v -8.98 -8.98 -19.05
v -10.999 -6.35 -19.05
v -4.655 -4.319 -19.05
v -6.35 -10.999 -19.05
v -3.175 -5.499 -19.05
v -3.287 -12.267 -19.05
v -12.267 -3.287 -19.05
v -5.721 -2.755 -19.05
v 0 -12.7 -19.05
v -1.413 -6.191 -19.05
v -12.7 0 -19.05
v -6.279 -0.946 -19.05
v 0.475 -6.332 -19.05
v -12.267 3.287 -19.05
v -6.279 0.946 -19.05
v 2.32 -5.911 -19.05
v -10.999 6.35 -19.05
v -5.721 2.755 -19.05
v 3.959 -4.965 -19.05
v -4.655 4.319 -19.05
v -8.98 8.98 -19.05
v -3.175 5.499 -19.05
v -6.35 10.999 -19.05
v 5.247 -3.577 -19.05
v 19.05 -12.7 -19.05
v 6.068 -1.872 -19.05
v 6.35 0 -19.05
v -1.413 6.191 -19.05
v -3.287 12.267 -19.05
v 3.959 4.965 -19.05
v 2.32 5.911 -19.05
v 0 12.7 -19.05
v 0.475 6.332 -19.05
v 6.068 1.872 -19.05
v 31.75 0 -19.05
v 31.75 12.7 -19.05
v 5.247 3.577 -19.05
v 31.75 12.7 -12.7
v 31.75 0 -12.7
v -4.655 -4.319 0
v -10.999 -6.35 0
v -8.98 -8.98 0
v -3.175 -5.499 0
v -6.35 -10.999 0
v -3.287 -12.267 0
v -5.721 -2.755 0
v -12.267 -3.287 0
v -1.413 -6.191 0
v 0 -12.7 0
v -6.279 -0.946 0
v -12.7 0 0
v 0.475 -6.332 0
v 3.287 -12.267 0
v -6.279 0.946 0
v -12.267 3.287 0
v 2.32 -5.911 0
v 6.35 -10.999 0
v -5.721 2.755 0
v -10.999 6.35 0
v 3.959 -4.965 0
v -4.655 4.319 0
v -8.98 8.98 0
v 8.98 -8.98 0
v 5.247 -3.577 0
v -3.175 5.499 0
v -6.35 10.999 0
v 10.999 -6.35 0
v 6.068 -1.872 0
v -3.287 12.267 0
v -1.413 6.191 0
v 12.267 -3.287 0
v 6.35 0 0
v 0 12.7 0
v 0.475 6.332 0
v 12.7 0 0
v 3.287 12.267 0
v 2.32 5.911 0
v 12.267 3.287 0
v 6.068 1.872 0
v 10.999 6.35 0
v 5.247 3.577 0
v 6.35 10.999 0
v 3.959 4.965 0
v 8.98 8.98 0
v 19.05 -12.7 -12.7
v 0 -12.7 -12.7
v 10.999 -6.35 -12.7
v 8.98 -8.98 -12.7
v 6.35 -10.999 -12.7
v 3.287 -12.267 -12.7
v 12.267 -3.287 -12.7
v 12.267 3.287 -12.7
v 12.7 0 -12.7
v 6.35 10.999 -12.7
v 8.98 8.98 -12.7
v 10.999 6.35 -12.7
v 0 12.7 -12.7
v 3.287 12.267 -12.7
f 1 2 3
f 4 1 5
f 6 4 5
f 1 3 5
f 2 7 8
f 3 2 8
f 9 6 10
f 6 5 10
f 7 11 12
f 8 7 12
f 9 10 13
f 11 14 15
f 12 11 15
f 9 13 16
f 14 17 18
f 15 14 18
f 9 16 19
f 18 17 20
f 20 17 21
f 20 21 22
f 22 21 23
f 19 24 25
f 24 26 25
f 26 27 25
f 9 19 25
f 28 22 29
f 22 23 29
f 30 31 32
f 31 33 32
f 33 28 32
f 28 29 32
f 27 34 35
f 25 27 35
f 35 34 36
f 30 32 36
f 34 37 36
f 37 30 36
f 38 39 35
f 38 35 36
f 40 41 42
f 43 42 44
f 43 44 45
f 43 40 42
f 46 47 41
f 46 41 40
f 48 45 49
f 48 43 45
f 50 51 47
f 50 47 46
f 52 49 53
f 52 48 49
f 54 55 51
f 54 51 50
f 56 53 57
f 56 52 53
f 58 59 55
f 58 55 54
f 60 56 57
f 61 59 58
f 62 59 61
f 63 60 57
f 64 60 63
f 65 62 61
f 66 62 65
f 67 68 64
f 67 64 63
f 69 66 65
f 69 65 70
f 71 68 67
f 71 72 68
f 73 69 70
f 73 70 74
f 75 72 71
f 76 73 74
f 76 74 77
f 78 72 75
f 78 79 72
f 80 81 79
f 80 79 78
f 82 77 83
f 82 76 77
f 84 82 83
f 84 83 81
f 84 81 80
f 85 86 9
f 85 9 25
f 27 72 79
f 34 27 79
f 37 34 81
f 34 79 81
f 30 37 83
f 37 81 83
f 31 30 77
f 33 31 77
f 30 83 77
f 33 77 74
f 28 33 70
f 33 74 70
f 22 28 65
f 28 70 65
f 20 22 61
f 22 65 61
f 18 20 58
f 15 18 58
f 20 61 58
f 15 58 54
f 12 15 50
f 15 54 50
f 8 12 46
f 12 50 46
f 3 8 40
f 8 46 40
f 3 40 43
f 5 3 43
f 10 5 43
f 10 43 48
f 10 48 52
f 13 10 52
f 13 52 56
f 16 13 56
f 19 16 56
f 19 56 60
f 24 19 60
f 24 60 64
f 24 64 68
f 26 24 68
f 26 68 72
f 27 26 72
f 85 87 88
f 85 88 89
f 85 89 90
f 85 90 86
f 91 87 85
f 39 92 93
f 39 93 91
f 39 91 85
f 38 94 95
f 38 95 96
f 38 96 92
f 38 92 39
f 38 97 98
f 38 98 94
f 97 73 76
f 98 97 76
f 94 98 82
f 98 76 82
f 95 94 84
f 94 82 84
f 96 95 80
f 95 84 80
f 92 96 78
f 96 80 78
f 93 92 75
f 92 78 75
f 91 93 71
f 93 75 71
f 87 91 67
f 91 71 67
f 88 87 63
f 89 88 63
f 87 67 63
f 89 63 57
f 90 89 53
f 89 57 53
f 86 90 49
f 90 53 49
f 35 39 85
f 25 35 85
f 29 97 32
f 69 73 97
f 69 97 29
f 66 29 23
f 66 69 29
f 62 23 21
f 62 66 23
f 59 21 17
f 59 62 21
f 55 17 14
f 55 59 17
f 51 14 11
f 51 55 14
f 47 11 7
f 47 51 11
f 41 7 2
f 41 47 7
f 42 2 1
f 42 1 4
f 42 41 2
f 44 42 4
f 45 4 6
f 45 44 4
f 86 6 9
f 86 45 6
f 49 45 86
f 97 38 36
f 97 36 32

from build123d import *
from build123d import SkipClean  # not in build123d's __all__

# Parameters (mm, degrees)
F1_DEPTH = 19.05
F3_DEPTH = 25.4
F4_R     = 6.35
F5_DEPTH = 25.4
F7_DEPTH = 12.7


with BuildPart() as f1:
    # F0 (on Top) → F1 (new body)
    with BuildSketch(Plane.XY):
        with BuildLine():
            ThreePointArc((0, -12.7), (8.9802561211, -8.9802561211), (12.7, 0))
            ThreePointArc((12.7, 0), (8.9802561211, 8.9802561211), (0, 12.7))
            ThreePointArc((0, 12.7), (-12.7, 0), (0, -12.7))
        make_face()
        with BuildLine():
            ThreePointArc((0, 12.7), (8.9802561211, 8.9802561211), (12.7, 0))
            ThreePointArc((12.7, 0), (8.9802561211, -8.9802561211), (0, -12.7))
            Line((0, -12.7), (31.75, -12.7))
            Line((31.75, -12.7), (31.75, 12.7))
            Line((31.75, 12.7), (0, 12.7))
        make_face()
    extrude(amount=-F1_DEPTH)

    # F2 (on Top) → F3 (cut)
    with BuildSketch(Plane.XY):
        Polygon((31.75, 0), (19.05, -12.7), (31.75, -12.7), align=None)
    extrude(amount=-F3_DEPTH, mode=Mode.SUBTRACT)

    # F4 (on Top) → F5 (cut)
    with BuildSketch(Plane.XY):
        Circle(F4_R)
    extrude(amount=-F5_DEPTH, mode=Mode.SUBTRACT)

    # F6 (on Top) → F7 (cut)
    with BuildSketch(Plane.XY):
        with BuildLine():
            Line((36.2295210361, 12.7), (0, 12.7))
            ThreePointArc((0, 12.7), (12.7, 0), (0, -12.7))
            Line((0, -12.7), (36.2295210361, -12.7))
            Line((36.2295210361, -12.7), (36.2295210361, 12.7))
        make_face()
    with SkipClean():  # cleaning this boolean's faces spoils the solid; the shape is the same uncleaned
        extrude(amount=-F7_DEPTH, mode=Mode.SUBTRACT)


solid = f1.part
